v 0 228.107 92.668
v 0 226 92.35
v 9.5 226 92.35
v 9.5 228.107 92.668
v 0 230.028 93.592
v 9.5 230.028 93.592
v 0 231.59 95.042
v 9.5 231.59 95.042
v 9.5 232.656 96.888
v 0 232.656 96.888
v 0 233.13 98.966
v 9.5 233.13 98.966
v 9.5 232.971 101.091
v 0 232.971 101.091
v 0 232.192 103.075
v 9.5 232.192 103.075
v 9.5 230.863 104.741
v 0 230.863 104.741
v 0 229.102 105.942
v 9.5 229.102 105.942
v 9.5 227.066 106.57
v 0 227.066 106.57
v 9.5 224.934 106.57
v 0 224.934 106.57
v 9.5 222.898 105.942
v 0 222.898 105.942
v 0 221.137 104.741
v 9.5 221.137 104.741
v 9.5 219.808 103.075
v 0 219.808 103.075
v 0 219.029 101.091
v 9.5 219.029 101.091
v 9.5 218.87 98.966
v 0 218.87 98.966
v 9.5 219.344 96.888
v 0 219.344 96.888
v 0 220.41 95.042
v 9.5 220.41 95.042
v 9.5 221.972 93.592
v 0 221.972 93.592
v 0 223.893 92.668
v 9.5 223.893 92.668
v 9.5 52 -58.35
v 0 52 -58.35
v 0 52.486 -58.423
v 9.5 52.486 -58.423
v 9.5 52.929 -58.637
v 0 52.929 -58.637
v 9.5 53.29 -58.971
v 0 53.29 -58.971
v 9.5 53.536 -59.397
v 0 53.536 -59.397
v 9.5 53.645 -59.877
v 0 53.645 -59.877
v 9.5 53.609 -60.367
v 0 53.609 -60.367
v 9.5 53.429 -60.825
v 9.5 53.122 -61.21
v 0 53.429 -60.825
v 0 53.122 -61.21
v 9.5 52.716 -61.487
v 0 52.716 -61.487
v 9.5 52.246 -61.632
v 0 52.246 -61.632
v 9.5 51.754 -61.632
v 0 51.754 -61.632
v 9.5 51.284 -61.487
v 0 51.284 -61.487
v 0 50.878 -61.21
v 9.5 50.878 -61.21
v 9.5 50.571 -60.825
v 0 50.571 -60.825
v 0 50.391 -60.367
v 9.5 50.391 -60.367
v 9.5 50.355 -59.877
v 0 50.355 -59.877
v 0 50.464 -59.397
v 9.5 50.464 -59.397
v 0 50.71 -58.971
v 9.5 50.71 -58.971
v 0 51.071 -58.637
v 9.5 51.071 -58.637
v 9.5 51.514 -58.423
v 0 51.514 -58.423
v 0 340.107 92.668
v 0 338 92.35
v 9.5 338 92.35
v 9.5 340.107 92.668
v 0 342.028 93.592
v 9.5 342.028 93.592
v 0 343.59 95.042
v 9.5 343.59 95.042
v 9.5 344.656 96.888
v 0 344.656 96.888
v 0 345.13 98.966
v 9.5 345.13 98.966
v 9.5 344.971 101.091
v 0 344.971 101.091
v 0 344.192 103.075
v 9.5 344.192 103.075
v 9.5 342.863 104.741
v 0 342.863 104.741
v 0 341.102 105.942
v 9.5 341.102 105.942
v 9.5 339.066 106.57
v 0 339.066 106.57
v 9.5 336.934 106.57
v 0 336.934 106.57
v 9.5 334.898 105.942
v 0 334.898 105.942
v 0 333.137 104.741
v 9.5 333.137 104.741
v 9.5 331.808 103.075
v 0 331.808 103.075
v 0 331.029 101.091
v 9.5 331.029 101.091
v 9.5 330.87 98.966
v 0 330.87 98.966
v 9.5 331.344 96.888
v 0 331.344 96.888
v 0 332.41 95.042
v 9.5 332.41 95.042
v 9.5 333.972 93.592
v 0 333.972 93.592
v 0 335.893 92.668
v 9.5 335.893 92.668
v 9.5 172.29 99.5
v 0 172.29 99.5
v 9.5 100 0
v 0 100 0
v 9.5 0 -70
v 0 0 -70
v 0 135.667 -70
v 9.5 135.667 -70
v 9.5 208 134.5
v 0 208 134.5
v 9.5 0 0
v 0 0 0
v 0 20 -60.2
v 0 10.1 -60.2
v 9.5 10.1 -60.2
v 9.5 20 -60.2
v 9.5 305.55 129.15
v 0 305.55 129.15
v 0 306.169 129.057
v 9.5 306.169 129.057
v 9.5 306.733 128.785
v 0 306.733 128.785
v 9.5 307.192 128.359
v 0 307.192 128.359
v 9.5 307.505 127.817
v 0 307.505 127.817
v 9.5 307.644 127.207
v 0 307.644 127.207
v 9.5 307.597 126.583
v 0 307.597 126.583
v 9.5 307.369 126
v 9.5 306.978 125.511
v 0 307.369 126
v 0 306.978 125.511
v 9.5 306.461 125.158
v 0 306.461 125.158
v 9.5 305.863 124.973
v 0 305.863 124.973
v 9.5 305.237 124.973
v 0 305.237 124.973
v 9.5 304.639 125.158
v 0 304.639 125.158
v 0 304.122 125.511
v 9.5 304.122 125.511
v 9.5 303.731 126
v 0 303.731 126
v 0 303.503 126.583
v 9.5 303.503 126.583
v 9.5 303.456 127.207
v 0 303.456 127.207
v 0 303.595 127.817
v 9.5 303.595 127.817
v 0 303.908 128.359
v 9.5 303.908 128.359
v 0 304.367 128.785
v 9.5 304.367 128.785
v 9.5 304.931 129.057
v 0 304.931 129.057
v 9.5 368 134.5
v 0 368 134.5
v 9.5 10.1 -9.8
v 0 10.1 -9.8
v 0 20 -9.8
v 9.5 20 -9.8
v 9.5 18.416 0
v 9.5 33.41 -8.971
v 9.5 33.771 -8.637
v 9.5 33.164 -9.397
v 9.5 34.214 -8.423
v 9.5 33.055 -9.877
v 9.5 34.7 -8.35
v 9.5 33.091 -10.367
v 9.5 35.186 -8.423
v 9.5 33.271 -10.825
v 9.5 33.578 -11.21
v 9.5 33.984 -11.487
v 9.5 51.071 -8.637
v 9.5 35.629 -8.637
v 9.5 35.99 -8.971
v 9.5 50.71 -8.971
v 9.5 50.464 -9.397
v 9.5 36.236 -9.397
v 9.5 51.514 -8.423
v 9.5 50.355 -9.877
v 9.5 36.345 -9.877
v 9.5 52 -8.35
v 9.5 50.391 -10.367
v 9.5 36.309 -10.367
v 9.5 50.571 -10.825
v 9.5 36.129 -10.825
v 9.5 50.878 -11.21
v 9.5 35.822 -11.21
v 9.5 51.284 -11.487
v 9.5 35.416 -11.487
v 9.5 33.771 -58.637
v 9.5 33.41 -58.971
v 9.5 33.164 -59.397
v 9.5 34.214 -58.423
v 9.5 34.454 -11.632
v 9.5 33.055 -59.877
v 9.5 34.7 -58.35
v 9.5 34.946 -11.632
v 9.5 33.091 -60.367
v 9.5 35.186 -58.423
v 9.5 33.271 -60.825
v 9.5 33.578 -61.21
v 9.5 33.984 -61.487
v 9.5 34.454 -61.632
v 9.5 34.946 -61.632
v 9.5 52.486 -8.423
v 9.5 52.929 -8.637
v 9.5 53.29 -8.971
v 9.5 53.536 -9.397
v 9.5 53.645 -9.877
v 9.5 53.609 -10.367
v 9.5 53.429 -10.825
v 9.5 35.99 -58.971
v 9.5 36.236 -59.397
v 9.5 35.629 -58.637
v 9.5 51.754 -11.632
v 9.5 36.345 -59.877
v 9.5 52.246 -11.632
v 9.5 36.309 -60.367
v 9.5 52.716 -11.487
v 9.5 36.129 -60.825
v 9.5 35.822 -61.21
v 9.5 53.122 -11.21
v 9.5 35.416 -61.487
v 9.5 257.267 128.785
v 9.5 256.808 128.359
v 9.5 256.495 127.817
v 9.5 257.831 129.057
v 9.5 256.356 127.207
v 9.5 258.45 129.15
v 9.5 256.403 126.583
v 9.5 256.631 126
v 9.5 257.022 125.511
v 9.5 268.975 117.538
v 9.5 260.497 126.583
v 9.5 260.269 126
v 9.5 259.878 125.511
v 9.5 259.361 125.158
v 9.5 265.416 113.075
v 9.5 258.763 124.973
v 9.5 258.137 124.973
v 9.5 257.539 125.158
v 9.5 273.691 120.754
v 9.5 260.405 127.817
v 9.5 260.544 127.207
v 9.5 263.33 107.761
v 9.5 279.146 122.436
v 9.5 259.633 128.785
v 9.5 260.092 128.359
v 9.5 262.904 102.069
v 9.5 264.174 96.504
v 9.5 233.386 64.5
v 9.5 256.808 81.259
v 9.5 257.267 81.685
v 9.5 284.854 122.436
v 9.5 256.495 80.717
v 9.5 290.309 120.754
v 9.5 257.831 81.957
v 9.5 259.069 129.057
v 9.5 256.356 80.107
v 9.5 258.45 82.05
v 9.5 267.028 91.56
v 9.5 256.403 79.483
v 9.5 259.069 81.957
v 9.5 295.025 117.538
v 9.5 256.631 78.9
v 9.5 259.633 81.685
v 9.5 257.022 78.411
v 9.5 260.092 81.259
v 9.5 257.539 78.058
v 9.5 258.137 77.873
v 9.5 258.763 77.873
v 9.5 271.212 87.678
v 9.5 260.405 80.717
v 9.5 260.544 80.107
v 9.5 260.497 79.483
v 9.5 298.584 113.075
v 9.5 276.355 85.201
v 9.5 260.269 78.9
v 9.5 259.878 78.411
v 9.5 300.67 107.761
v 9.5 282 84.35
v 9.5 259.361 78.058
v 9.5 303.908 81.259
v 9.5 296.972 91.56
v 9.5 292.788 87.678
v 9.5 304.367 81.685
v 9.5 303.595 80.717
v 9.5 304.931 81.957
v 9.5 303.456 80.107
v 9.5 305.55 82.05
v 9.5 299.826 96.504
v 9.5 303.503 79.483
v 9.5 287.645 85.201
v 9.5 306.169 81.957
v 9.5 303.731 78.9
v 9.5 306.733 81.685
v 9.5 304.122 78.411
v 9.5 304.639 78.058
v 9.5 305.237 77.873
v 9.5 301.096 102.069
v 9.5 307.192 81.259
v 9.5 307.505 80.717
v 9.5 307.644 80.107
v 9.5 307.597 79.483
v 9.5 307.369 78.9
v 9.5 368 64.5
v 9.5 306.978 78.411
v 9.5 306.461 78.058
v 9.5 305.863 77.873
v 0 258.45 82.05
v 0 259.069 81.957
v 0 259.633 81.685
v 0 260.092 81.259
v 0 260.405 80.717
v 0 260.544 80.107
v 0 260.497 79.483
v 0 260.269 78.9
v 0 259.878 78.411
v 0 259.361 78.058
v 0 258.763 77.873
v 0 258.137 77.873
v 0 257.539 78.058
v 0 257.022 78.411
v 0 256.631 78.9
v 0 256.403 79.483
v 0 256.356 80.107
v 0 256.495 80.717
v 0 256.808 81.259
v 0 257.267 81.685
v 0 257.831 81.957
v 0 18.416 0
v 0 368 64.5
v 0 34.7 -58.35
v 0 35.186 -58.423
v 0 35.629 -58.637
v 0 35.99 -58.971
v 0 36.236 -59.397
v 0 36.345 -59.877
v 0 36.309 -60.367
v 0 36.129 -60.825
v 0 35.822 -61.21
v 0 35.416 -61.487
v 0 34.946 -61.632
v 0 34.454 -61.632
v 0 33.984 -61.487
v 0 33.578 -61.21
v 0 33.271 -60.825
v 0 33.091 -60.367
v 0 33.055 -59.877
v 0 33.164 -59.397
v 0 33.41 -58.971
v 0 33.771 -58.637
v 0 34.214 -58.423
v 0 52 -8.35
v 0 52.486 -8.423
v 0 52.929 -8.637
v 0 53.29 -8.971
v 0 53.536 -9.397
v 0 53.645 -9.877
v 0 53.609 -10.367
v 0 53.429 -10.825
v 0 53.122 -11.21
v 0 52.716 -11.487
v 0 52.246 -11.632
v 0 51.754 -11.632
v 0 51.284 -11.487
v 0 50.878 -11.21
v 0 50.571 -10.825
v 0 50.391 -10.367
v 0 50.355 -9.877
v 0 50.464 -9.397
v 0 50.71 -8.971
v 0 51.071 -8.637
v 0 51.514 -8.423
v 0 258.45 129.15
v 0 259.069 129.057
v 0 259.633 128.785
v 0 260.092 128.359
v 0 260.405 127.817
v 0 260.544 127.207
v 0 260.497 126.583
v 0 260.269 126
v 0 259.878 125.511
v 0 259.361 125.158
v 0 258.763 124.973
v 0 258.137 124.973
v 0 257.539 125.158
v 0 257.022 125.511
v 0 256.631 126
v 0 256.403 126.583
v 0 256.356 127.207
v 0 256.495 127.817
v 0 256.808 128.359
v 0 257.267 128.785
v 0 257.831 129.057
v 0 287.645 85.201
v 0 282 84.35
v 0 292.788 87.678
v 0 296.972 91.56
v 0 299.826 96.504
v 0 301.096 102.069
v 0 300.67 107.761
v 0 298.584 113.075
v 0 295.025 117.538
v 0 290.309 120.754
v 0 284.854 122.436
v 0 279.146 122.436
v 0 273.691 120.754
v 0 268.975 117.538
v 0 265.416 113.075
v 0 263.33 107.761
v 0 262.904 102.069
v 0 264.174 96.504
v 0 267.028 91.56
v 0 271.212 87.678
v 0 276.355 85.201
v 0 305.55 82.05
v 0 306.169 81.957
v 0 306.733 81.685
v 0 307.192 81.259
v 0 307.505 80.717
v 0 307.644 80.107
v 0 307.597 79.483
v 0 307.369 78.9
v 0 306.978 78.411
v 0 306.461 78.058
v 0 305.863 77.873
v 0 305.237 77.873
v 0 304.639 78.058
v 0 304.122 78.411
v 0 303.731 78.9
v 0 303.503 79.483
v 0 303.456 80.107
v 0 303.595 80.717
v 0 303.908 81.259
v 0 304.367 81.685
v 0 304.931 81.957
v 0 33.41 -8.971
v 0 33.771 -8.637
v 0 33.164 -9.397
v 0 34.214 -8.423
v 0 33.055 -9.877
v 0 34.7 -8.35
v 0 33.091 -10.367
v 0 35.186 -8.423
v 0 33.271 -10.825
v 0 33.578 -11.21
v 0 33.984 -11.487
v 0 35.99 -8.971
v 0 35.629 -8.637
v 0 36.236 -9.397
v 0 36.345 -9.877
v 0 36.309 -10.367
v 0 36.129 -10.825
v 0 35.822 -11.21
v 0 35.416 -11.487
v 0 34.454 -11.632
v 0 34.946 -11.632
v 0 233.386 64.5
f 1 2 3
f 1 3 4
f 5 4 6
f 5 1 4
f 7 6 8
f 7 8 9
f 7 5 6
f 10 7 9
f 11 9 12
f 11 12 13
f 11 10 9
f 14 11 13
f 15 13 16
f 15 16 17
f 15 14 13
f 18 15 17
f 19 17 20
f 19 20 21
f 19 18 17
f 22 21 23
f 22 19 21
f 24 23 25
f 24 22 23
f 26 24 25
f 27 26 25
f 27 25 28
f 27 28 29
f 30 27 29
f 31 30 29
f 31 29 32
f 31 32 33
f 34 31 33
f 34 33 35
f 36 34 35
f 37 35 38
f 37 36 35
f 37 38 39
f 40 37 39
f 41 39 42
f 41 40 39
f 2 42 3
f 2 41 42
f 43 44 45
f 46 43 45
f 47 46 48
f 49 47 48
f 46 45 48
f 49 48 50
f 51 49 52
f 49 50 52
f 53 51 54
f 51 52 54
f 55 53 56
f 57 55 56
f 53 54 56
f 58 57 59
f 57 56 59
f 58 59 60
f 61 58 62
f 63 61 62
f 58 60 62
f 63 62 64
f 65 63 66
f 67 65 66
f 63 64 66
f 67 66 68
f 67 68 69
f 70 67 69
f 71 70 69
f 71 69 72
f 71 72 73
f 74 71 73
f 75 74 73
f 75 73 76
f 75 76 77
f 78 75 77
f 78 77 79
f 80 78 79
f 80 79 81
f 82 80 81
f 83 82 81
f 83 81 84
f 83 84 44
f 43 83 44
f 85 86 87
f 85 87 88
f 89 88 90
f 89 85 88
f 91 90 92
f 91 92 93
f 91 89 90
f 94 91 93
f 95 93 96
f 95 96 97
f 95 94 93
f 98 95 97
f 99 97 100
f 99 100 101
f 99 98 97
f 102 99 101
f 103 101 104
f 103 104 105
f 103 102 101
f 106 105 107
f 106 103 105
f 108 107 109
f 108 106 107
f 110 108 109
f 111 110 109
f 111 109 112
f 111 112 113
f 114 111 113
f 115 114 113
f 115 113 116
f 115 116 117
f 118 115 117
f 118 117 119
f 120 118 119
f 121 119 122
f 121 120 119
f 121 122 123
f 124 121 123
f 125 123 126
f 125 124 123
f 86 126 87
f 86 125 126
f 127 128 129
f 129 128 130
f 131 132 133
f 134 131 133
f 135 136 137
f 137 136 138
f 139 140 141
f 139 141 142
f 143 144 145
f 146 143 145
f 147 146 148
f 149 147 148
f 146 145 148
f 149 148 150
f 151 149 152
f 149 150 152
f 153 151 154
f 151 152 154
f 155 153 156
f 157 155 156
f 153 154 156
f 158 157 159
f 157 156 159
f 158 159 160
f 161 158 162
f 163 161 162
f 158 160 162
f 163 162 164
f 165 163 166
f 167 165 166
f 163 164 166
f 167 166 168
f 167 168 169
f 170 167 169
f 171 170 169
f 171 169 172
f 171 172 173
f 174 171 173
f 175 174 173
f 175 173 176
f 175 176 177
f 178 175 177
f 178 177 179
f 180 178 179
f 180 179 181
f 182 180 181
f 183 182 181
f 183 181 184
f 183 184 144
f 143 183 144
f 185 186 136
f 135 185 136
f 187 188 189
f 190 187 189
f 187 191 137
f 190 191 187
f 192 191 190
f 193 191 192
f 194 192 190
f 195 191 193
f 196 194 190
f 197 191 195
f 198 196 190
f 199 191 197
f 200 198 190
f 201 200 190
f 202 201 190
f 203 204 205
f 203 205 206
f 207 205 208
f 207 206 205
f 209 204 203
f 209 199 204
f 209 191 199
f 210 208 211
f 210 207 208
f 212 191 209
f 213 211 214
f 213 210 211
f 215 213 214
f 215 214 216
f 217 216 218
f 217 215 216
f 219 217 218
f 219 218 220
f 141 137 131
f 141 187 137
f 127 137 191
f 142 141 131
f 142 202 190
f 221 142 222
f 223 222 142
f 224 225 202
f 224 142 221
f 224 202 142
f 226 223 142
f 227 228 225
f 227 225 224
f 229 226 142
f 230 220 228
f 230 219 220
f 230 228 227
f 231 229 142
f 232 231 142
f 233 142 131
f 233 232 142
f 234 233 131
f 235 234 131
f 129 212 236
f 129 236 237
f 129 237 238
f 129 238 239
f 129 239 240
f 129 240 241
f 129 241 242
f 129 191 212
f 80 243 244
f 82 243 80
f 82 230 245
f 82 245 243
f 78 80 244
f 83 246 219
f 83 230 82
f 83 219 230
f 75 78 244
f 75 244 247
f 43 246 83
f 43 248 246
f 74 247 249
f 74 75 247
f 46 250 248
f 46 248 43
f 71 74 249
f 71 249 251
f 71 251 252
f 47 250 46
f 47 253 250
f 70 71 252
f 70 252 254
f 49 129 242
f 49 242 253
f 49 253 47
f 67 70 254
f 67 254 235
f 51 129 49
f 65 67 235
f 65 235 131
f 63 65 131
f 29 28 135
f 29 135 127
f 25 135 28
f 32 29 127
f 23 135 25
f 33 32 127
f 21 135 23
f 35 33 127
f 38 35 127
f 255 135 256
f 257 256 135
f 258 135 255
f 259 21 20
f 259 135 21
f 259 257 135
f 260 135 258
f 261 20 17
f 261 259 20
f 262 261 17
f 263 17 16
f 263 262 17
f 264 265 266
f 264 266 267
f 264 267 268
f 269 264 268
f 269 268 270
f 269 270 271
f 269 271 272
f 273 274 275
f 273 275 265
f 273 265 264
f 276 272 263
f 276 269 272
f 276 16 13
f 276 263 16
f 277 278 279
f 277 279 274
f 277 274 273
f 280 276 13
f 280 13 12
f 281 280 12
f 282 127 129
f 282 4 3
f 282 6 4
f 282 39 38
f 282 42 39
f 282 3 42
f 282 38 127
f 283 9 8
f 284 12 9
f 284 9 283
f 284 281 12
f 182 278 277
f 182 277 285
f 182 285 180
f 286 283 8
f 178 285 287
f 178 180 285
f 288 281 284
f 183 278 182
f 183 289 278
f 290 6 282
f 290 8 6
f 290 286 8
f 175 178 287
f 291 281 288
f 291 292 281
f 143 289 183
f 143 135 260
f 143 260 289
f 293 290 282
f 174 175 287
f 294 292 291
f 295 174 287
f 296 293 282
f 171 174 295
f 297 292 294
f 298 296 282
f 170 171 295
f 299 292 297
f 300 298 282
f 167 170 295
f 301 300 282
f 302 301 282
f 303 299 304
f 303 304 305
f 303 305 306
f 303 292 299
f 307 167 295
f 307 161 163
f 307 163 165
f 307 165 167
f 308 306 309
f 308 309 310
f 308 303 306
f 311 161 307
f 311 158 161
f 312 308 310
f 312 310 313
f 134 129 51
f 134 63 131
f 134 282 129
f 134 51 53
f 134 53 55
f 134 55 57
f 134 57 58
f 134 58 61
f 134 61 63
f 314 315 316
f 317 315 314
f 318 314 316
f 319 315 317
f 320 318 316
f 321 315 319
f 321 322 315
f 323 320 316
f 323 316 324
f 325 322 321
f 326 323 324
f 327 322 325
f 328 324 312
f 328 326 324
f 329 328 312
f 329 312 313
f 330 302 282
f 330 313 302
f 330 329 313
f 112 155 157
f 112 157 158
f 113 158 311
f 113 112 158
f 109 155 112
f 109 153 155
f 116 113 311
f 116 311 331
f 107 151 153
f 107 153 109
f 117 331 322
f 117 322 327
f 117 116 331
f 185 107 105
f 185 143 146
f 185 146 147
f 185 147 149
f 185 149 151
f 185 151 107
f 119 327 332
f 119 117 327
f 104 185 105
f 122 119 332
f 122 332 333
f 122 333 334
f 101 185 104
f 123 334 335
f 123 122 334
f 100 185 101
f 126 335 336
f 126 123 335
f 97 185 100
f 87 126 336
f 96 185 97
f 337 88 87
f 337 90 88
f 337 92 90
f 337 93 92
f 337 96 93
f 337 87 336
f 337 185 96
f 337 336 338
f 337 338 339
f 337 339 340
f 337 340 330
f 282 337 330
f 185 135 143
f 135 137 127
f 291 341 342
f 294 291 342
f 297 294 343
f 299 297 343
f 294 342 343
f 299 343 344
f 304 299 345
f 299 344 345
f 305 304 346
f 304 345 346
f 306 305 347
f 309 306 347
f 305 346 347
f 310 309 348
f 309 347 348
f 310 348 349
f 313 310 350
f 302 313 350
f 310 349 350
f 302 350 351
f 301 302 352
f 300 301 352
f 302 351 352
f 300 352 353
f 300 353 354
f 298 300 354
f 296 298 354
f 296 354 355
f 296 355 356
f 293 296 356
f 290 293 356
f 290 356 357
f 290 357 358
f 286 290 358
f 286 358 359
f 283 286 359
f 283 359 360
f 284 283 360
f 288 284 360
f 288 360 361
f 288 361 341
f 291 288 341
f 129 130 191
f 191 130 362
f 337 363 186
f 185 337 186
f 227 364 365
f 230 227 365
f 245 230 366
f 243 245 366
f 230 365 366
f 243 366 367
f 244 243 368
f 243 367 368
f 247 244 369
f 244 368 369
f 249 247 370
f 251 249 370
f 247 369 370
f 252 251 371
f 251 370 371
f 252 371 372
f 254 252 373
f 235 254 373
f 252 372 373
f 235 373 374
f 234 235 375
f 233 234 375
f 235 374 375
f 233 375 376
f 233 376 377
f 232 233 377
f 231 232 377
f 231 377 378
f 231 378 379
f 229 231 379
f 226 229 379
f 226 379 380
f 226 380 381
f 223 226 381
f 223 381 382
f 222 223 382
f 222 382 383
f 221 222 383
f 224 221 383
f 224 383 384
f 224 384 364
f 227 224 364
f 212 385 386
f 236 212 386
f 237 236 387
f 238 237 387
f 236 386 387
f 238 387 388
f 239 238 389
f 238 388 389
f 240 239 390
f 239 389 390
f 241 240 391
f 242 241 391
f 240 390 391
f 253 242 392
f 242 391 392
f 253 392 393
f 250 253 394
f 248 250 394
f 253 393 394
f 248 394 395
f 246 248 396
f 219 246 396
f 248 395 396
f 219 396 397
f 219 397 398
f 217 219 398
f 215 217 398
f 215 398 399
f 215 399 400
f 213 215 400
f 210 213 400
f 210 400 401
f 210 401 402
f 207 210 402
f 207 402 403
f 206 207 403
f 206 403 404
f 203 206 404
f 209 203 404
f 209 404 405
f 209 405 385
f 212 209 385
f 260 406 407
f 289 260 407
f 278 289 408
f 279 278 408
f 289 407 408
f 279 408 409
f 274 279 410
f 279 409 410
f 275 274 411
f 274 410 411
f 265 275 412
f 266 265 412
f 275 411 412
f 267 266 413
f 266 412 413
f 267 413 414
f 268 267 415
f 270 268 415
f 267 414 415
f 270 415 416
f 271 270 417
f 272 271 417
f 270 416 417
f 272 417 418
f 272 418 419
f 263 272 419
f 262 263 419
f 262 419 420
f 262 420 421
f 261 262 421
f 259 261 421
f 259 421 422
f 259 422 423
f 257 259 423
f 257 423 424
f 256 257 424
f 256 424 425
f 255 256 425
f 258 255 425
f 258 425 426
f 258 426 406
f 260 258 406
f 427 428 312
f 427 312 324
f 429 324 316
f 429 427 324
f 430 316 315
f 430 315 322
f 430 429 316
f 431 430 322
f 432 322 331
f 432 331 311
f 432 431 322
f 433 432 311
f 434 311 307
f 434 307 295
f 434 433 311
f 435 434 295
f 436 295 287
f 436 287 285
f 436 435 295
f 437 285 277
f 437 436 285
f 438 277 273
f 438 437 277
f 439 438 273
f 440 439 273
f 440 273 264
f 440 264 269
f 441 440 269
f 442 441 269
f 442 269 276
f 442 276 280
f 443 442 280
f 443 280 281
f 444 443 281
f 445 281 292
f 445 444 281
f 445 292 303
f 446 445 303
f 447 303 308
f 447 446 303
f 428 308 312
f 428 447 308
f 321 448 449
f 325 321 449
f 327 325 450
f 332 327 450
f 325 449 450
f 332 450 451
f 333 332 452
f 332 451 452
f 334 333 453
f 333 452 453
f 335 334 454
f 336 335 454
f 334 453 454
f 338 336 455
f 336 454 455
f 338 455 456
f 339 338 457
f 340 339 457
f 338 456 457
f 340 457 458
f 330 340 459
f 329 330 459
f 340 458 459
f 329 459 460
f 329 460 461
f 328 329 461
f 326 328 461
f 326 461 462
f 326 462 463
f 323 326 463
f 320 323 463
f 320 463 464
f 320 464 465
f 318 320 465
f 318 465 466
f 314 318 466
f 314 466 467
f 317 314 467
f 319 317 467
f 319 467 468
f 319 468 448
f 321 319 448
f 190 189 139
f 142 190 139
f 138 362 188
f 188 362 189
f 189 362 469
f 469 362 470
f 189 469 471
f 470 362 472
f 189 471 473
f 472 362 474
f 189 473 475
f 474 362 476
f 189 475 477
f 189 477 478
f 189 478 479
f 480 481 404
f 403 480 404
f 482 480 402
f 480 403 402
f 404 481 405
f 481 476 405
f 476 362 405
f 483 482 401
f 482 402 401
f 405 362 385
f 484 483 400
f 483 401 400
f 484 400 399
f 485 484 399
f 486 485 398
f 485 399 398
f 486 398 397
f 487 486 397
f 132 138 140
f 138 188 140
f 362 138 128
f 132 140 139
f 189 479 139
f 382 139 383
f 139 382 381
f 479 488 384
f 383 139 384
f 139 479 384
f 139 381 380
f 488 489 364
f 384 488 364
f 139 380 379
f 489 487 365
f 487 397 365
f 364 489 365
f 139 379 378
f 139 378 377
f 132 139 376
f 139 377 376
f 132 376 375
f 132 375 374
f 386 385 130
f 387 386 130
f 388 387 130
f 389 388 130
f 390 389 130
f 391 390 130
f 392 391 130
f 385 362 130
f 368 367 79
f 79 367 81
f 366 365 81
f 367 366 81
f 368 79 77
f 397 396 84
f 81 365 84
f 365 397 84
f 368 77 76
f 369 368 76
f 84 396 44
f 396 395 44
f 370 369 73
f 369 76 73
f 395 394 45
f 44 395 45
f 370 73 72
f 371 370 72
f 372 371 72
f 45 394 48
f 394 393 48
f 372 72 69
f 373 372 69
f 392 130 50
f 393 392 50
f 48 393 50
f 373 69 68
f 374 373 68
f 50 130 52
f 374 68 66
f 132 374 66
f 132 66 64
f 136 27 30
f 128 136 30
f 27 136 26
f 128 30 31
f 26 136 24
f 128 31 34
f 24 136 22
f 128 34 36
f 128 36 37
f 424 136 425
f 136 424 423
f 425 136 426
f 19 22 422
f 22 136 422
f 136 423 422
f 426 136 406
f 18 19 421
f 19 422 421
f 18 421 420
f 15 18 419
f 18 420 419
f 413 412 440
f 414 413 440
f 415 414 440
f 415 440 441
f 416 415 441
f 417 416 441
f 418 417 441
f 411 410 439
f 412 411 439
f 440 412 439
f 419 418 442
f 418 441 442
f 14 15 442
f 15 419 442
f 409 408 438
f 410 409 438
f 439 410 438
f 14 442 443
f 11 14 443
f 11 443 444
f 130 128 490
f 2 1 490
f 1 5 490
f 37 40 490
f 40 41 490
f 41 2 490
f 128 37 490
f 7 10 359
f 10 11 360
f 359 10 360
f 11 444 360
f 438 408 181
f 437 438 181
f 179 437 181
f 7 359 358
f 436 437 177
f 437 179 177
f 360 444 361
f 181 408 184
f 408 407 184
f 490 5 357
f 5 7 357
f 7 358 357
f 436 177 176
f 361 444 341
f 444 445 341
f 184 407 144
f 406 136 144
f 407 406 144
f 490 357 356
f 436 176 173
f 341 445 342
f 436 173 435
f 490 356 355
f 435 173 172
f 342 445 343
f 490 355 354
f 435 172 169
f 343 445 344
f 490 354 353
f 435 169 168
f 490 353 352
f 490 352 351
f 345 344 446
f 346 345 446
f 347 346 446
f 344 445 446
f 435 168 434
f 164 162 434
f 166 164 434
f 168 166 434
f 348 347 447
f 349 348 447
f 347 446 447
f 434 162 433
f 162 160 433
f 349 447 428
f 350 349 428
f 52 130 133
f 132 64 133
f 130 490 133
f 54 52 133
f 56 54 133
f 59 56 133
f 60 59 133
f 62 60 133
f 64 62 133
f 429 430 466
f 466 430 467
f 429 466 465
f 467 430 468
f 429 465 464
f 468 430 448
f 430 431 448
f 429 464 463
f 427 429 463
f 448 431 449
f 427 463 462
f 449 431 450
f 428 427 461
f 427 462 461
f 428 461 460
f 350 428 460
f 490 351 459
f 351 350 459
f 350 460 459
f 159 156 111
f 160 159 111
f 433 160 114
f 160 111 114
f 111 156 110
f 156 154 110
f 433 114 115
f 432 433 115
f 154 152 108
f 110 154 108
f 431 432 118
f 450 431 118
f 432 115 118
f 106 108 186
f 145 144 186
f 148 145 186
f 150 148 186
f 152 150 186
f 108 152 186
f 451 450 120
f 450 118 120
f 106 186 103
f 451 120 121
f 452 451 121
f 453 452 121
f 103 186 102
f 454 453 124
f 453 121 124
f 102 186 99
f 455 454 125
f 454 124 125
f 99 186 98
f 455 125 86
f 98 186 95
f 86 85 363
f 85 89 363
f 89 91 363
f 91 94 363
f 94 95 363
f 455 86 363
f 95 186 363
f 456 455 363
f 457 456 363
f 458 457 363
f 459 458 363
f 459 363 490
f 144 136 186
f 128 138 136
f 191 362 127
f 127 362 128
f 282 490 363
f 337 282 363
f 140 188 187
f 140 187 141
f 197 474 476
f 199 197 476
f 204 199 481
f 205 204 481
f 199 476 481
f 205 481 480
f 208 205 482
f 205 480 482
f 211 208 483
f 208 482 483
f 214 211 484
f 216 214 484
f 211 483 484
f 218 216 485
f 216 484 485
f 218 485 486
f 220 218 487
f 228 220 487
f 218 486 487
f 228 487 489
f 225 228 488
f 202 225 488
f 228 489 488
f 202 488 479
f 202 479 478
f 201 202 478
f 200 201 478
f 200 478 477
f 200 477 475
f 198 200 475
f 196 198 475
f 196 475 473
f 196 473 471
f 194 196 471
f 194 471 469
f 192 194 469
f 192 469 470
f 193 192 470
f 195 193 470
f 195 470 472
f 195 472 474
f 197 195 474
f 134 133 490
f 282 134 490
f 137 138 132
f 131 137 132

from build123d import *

# Parameters (mm, degrees)
SKETCH1_R           = 7.15
SKETCH1_R_2         = 19.15
SKETCH1_W           = 50.4
SKETCH1_H           = 9.9
BOSS_EXTRUDE1_DEPTH = 9.5
M4_TAPPED_HOLE1_D   = 3.3
M5_TAPPED_HOLE2_D   = 4.2


with BuildPart() as part:
    # Sketch1 → Boss-Extrude1 (new body)
    with BuildSketch(Plane(origin=(0, 0, 0), x_dir=(0, 0, -1), z_dir=(1, 0, 0))):
        Polygon((0, 0), (70, 0), (70, 135.667122158), (-64.5, 233.385504136), (-64.5, 368), (-134.5, 368), (-134.5, 208), align=None)
        with Locations((-99.5, 338)):
            Circle(SKETCH1_R, mode=Mode.SUBTRACT)
        with Locations((-99.5, 226)):
            Circle(SKETCH1_R, mode=Mode.SUBTRACT)
        with Locations((-103.5, 282)):
            Circle(SKETCH1_R_2, mode=Mode.SUBTRACT)
        Polygon((-99.5, 172.289806742), (0, 100), (0, 18.416200794), align=None, mode=Mode.SUBTRACT)
        with Locations((35, 15.05)):
            Rectangle(SKETCH1_W, SKETCH1_H, mode=Mode.SUBTRACT)
    extrude(amount=BOSS_EXTRUDE1_DEPTH)

    # M4 Tapped Hole1 (through all)
    with Locations(Plane(origin=(9.5, 0, 0), x_dir=(0, 0, -1), z_dir=(1, 0, 0))):
        with Locations((10, 34.7), (10, 52), (60, 52), (60, 34.7)):
            Hole(M4_TAPPED_HOLE1_D / 2)

    # M5 Tapped Hole2 (through all)
    with Locations(Plane(origin=(9.5, 0, 0), x_dir=(0, 0, -1), z_dir=(1, 0, 0))):
        with Locations((-127.05, 305.55), (-79.95, 305.55), (-79.95, 258.45), (-127.05, 258.45)):
            Hole(M5_TAPPED_HOLE2_D / 2)


solid = part.part
